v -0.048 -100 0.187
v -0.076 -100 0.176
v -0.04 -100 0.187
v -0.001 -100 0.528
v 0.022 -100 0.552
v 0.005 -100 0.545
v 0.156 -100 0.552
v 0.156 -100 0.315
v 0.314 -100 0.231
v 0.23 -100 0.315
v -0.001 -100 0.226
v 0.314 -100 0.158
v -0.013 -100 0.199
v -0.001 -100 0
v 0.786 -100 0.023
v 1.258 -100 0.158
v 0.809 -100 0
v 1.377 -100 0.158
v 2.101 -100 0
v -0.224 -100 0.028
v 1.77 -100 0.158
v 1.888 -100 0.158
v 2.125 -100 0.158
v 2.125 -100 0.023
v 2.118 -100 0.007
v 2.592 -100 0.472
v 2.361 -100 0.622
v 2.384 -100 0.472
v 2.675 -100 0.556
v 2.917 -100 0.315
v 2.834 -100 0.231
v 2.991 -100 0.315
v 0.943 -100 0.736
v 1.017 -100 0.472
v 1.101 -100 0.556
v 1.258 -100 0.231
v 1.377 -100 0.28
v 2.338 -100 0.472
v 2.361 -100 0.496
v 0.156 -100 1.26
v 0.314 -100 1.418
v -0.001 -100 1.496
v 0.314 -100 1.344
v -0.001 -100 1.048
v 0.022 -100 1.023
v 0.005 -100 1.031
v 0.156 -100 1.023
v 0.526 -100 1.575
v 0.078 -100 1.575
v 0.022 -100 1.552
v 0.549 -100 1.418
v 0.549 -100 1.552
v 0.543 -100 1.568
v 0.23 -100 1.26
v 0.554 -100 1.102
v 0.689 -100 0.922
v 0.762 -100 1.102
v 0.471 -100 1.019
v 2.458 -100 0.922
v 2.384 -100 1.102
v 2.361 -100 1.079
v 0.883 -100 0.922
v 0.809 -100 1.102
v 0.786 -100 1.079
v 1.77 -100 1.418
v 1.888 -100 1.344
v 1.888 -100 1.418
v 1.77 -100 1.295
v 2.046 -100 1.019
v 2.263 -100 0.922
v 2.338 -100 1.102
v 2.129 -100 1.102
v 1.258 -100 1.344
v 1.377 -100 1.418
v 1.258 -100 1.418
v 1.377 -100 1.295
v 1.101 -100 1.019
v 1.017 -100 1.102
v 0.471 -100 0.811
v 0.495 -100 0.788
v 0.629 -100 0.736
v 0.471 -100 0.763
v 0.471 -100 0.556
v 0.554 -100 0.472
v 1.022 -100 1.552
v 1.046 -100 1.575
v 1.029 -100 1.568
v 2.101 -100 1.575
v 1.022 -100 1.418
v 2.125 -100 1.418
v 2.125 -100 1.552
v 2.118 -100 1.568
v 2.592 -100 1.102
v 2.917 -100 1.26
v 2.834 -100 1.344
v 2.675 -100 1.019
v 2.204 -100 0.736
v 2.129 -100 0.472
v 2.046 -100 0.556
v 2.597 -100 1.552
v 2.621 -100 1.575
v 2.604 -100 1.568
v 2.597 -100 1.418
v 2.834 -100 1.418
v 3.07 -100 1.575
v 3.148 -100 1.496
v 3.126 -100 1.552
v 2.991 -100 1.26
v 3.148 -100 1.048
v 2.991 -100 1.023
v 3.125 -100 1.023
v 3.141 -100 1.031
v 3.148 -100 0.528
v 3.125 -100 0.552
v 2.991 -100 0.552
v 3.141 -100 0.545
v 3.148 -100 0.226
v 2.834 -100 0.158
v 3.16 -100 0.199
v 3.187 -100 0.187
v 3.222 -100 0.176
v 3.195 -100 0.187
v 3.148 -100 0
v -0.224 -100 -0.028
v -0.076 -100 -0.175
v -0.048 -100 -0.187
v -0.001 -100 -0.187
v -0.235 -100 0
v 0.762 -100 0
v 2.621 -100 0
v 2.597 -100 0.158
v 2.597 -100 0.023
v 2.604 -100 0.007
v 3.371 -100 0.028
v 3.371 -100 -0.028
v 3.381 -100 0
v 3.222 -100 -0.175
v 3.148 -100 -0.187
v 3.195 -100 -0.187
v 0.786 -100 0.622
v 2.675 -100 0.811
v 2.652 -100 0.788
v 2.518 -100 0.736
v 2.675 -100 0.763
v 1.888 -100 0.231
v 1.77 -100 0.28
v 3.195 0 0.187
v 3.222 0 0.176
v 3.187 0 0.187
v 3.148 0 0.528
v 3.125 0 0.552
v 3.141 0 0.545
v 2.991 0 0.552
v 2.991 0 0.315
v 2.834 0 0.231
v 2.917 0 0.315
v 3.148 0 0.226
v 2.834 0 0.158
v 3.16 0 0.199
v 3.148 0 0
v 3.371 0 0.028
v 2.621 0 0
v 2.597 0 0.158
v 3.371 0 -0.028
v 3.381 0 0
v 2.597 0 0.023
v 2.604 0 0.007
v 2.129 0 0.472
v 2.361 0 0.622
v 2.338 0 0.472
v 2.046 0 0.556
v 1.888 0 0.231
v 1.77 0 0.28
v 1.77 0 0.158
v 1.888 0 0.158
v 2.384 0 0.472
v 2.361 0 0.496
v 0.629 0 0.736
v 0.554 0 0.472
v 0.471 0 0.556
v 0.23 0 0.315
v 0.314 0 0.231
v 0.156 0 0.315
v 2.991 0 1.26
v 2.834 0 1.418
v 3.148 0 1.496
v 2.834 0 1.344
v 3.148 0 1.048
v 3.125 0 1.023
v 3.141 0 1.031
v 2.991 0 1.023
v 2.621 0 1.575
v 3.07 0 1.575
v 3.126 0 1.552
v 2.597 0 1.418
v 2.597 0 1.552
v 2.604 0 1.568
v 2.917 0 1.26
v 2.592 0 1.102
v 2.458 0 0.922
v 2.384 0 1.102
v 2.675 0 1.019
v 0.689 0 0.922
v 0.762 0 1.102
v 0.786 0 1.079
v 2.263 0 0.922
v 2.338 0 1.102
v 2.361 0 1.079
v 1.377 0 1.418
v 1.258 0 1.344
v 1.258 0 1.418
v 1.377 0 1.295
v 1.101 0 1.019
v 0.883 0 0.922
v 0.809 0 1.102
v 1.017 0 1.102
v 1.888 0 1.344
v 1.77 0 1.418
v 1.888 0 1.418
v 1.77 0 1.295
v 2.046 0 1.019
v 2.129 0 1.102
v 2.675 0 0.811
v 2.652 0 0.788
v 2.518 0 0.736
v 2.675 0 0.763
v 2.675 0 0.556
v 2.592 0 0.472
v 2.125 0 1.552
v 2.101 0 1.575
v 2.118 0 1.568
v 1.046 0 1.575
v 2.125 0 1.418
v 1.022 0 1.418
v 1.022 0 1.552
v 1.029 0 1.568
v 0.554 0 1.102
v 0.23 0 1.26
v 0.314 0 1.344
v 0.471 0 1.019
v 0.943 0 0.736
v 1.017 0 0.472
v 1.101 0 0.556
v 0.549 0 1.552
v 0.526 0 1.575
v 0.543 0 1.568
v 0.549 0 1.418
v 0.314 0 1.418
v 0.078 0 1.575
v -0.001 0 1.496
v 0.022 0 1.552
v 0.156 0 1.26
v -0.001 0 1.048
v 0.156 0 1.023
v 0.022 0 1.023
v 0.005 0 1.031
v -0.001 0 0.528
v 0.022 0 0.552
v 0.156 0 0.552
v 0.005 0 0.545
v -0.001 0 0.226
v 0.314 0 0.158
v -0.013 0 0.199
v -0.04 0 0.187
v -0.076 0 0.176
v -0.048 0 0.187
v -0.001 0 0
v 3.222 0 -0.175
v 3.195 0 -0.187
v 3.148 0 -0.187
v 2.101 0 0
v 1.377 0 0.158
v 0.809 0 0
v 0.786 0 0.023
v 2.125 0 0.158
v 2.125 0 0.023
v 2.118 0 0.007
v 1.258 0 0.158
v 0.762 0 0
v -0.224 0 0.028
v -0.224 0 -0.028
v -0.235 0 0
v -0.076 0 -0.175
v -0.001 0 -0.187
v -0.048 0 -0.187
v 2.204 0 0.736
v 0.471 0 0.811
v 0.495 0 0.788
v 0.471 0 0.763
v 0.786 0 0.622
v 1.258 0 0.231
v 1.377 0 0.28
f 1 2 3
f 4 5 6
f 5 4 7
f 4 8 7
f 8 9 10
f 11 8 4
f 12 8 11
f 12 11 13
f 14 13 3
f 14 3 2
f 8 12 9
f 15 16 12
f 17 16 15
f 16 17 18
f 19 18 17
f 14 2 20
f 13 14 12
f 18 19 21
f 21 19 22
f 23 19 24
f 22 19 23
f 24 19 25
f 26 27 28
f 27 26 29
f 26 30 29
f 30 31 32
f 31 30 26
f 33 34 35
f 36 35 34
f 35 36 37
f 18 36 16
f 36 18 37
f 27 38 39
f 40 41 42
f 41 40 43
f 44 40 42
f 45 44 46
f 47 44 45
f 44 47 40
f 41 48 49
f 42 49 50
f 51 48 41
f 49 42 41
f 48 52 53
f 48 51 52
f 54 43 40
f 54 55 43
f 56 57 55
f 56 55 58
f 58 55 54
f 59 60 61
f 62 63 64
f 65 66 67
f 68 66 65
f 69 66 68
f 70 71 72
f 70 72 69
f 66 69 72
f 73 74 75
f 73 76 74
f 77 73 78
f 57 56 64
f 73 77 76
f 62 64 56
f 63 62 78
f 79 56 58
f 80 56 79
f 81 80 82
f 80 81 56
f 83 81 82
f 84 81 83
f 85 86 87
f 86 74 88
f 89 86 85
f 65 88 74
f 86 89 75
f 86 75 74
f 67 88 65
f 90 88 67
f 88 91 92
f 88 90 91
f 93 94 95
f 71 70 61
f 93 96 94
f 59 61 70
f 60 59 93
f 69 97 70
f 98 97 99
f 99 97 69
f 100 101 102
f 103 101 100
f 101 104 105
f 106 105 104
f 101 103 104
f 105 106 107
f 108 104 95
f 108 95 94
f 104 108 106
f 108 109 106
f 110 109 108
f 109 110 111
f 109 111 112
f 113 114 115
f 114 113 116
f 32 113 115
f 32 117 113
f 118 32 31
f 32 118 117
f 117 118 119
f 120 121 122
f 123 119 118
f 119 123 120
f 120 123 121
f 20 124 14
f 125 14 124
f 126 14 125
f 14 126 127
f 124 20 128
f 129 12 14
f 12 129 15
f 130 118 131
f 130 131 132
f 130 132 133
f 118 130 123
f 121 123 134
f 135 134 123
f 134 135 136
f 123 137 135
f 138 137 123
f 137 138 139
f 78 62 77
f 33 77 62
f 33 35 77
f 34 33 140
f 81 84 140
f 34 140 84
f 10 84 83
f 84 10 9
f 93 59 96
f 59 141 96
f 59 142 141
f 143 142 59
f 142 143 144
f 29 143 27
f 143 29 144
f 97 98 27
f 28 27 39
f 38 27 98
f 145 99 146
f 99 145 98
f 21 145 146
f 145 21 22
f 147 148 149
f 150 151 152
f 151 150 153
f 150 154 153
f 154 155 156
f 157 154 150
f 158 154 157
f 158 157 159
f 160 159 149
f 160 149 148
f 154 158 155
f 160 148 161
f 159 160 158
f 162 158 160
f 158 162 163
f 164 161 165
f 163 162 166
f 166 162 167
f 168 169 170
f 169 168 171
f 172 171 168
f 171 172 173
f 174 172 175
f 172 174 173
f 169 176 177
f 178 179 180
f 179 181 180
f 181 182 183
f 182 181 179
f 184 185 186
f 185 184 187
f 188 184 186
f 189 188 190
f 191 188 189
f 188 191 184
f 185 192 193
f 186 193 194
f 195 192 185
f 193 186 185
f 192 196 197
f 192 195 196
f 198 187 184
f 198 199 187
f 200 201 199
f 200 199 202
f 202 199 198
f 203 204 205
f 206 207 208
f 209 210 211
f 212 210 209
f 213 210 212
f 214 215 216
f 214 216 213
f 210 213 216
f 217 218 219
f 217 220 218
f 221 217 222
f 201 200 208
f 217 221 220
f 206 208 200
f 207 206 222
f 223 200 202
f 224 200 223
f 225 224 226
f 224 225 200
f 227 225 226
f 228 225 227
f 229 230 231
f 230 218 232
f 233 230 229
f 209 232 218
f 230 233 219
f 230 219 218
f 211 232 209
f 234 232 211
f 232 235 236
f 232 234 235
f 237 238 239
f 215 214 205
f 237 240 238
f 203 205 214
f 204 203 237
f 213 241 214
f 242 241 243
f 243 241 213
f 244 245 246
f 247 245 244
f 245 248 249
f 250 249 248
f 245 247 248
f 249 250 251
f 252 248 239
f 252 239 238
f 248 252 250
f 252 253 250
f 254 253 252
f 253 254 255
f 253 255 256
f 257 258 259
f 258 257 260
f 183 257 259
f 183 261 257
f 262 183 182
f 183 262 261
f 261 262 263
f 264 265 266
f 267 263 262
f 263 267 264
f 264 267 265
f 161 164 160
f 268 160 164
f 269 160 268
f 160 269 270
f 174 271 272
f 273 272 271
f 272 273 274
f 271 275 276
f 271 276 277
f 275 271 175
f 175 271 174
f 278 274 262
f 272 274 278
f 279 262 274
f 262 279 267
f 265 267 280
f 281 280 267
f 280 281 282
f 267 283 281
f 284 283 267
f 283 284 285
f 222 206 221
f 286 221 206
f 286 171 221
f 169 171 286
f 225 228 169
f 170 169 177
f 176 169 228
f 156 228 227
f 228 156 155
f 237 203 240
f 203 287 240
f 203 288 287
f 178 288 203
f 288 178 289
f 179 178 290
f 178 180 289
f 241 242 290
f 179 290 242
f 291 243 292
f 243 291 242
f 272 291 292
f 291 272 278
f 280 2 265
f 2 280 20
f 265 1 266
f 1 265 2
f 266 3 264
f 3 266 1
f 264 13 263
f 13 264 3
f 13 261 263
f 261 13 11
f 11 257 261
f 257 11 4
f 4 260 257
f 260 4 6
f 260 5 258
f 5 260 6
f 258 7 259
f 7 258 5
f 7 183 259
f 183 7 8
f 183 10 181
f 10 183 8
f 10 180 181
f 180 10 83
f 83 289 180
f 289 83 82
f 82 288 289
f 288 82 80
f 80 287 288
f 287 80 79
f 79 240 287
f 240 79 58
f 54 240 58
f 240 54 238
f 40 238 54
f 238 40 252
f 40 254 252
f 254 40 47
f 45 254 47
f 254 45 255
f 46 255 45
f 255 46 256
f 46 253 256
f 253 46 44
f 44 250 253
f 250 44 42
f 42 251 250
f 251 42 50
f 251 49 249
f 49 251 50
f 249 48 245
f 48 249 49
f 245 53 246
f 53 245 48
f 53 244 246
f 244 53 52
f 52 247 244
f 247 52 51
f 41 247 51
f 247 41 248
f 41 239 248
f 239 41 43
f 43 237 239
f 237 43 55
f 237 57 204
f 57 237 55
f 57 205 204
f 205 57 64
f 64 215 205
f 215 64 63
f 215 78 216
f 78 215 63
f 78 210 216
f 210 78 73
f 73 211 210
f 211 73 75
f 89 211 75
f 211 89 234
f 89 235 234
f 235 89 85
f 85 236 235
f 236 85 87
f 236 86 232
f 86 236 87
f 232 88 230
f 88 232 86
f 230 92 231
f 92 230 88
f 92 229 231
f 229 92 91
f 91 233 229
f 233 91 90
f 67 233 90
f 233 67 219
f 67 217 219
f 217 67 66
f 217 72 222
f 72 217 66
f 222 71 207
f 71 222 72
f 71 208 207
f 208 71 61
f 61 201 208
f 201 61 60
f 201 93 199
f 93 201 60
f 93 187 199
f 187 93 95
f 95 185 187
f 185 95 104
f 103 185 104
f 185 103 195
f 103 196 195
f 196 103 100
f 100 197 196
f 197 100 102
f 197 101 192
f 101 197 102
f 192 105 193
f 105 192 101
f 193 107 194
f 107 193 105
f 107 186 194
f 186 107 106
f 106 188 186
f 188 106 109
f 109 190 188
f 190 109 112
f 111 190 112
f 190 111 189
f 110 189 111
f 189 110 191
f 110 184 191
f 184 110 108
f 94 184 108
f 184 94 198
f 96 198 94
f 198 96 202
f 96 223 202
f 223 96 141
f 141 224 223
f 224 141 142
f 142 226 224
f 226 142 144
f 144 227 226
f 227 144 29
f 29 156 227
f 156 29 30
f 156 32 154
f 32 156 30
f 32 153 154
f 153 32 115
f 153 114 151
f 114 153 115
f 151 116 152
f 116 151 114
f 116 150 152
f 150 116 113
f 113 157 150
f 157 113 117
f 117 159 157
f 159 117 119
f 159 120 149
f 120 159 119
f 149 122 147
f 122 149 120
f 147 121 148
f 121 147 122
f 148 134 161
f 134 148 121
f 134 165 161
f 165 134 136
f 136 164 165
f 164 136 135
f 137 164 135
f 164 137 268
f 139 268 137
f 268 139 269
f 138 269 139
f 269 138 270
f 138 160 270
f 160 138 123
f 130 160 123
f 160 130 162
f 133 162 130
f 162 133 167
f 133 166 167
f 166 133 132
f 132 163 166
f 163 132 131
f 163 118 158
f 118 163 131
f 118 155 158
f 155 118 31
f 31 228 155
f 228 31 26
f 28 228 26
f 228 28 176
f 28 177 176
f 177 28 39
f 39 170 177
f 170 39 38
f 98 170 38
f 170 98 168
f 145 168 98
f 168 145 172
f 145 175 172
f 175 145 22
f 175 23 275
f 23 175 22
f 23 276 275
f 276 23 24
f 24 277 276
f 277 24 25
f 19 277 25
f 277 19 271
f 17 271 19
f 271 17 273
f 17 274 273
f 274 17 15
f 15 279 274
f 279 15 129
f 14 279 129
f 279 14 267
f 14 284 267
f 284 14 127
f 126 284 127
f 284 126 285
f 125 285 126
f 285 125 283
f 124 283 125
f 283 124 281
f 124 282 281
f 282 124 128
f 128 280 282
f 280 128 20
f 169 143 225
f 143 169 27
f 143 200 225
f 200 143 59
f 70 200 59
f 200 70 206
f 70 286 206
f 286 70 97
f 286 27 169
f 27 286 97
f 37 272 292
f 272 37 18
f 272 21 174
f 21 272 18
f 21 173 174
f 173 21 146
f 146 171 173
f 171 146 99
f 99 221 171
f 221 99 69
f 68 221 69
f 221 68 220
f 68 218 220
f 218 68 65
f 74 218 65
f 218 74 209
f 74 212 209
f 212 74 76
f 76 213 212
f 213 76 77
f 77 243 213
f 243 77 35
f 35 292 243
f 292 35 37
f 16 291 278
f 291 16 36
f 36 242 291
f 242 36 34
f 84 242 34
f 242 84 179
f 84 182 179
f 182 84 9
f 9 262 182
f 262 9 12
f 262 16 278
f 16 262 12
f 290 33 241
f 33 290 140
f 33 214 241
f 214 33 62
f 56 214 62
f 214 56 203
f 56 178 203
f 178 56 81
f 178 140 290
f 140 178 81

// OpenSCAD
module makerslide()
{
	rotate([90,90,0])
	translate([-4.99,-4.1,0])
	difference()
	{
		translate([3,3,0]) cube ([4,5,100]);
		linear_extrude(file = "makerslide.dxf");
	}
}

makerslide();
